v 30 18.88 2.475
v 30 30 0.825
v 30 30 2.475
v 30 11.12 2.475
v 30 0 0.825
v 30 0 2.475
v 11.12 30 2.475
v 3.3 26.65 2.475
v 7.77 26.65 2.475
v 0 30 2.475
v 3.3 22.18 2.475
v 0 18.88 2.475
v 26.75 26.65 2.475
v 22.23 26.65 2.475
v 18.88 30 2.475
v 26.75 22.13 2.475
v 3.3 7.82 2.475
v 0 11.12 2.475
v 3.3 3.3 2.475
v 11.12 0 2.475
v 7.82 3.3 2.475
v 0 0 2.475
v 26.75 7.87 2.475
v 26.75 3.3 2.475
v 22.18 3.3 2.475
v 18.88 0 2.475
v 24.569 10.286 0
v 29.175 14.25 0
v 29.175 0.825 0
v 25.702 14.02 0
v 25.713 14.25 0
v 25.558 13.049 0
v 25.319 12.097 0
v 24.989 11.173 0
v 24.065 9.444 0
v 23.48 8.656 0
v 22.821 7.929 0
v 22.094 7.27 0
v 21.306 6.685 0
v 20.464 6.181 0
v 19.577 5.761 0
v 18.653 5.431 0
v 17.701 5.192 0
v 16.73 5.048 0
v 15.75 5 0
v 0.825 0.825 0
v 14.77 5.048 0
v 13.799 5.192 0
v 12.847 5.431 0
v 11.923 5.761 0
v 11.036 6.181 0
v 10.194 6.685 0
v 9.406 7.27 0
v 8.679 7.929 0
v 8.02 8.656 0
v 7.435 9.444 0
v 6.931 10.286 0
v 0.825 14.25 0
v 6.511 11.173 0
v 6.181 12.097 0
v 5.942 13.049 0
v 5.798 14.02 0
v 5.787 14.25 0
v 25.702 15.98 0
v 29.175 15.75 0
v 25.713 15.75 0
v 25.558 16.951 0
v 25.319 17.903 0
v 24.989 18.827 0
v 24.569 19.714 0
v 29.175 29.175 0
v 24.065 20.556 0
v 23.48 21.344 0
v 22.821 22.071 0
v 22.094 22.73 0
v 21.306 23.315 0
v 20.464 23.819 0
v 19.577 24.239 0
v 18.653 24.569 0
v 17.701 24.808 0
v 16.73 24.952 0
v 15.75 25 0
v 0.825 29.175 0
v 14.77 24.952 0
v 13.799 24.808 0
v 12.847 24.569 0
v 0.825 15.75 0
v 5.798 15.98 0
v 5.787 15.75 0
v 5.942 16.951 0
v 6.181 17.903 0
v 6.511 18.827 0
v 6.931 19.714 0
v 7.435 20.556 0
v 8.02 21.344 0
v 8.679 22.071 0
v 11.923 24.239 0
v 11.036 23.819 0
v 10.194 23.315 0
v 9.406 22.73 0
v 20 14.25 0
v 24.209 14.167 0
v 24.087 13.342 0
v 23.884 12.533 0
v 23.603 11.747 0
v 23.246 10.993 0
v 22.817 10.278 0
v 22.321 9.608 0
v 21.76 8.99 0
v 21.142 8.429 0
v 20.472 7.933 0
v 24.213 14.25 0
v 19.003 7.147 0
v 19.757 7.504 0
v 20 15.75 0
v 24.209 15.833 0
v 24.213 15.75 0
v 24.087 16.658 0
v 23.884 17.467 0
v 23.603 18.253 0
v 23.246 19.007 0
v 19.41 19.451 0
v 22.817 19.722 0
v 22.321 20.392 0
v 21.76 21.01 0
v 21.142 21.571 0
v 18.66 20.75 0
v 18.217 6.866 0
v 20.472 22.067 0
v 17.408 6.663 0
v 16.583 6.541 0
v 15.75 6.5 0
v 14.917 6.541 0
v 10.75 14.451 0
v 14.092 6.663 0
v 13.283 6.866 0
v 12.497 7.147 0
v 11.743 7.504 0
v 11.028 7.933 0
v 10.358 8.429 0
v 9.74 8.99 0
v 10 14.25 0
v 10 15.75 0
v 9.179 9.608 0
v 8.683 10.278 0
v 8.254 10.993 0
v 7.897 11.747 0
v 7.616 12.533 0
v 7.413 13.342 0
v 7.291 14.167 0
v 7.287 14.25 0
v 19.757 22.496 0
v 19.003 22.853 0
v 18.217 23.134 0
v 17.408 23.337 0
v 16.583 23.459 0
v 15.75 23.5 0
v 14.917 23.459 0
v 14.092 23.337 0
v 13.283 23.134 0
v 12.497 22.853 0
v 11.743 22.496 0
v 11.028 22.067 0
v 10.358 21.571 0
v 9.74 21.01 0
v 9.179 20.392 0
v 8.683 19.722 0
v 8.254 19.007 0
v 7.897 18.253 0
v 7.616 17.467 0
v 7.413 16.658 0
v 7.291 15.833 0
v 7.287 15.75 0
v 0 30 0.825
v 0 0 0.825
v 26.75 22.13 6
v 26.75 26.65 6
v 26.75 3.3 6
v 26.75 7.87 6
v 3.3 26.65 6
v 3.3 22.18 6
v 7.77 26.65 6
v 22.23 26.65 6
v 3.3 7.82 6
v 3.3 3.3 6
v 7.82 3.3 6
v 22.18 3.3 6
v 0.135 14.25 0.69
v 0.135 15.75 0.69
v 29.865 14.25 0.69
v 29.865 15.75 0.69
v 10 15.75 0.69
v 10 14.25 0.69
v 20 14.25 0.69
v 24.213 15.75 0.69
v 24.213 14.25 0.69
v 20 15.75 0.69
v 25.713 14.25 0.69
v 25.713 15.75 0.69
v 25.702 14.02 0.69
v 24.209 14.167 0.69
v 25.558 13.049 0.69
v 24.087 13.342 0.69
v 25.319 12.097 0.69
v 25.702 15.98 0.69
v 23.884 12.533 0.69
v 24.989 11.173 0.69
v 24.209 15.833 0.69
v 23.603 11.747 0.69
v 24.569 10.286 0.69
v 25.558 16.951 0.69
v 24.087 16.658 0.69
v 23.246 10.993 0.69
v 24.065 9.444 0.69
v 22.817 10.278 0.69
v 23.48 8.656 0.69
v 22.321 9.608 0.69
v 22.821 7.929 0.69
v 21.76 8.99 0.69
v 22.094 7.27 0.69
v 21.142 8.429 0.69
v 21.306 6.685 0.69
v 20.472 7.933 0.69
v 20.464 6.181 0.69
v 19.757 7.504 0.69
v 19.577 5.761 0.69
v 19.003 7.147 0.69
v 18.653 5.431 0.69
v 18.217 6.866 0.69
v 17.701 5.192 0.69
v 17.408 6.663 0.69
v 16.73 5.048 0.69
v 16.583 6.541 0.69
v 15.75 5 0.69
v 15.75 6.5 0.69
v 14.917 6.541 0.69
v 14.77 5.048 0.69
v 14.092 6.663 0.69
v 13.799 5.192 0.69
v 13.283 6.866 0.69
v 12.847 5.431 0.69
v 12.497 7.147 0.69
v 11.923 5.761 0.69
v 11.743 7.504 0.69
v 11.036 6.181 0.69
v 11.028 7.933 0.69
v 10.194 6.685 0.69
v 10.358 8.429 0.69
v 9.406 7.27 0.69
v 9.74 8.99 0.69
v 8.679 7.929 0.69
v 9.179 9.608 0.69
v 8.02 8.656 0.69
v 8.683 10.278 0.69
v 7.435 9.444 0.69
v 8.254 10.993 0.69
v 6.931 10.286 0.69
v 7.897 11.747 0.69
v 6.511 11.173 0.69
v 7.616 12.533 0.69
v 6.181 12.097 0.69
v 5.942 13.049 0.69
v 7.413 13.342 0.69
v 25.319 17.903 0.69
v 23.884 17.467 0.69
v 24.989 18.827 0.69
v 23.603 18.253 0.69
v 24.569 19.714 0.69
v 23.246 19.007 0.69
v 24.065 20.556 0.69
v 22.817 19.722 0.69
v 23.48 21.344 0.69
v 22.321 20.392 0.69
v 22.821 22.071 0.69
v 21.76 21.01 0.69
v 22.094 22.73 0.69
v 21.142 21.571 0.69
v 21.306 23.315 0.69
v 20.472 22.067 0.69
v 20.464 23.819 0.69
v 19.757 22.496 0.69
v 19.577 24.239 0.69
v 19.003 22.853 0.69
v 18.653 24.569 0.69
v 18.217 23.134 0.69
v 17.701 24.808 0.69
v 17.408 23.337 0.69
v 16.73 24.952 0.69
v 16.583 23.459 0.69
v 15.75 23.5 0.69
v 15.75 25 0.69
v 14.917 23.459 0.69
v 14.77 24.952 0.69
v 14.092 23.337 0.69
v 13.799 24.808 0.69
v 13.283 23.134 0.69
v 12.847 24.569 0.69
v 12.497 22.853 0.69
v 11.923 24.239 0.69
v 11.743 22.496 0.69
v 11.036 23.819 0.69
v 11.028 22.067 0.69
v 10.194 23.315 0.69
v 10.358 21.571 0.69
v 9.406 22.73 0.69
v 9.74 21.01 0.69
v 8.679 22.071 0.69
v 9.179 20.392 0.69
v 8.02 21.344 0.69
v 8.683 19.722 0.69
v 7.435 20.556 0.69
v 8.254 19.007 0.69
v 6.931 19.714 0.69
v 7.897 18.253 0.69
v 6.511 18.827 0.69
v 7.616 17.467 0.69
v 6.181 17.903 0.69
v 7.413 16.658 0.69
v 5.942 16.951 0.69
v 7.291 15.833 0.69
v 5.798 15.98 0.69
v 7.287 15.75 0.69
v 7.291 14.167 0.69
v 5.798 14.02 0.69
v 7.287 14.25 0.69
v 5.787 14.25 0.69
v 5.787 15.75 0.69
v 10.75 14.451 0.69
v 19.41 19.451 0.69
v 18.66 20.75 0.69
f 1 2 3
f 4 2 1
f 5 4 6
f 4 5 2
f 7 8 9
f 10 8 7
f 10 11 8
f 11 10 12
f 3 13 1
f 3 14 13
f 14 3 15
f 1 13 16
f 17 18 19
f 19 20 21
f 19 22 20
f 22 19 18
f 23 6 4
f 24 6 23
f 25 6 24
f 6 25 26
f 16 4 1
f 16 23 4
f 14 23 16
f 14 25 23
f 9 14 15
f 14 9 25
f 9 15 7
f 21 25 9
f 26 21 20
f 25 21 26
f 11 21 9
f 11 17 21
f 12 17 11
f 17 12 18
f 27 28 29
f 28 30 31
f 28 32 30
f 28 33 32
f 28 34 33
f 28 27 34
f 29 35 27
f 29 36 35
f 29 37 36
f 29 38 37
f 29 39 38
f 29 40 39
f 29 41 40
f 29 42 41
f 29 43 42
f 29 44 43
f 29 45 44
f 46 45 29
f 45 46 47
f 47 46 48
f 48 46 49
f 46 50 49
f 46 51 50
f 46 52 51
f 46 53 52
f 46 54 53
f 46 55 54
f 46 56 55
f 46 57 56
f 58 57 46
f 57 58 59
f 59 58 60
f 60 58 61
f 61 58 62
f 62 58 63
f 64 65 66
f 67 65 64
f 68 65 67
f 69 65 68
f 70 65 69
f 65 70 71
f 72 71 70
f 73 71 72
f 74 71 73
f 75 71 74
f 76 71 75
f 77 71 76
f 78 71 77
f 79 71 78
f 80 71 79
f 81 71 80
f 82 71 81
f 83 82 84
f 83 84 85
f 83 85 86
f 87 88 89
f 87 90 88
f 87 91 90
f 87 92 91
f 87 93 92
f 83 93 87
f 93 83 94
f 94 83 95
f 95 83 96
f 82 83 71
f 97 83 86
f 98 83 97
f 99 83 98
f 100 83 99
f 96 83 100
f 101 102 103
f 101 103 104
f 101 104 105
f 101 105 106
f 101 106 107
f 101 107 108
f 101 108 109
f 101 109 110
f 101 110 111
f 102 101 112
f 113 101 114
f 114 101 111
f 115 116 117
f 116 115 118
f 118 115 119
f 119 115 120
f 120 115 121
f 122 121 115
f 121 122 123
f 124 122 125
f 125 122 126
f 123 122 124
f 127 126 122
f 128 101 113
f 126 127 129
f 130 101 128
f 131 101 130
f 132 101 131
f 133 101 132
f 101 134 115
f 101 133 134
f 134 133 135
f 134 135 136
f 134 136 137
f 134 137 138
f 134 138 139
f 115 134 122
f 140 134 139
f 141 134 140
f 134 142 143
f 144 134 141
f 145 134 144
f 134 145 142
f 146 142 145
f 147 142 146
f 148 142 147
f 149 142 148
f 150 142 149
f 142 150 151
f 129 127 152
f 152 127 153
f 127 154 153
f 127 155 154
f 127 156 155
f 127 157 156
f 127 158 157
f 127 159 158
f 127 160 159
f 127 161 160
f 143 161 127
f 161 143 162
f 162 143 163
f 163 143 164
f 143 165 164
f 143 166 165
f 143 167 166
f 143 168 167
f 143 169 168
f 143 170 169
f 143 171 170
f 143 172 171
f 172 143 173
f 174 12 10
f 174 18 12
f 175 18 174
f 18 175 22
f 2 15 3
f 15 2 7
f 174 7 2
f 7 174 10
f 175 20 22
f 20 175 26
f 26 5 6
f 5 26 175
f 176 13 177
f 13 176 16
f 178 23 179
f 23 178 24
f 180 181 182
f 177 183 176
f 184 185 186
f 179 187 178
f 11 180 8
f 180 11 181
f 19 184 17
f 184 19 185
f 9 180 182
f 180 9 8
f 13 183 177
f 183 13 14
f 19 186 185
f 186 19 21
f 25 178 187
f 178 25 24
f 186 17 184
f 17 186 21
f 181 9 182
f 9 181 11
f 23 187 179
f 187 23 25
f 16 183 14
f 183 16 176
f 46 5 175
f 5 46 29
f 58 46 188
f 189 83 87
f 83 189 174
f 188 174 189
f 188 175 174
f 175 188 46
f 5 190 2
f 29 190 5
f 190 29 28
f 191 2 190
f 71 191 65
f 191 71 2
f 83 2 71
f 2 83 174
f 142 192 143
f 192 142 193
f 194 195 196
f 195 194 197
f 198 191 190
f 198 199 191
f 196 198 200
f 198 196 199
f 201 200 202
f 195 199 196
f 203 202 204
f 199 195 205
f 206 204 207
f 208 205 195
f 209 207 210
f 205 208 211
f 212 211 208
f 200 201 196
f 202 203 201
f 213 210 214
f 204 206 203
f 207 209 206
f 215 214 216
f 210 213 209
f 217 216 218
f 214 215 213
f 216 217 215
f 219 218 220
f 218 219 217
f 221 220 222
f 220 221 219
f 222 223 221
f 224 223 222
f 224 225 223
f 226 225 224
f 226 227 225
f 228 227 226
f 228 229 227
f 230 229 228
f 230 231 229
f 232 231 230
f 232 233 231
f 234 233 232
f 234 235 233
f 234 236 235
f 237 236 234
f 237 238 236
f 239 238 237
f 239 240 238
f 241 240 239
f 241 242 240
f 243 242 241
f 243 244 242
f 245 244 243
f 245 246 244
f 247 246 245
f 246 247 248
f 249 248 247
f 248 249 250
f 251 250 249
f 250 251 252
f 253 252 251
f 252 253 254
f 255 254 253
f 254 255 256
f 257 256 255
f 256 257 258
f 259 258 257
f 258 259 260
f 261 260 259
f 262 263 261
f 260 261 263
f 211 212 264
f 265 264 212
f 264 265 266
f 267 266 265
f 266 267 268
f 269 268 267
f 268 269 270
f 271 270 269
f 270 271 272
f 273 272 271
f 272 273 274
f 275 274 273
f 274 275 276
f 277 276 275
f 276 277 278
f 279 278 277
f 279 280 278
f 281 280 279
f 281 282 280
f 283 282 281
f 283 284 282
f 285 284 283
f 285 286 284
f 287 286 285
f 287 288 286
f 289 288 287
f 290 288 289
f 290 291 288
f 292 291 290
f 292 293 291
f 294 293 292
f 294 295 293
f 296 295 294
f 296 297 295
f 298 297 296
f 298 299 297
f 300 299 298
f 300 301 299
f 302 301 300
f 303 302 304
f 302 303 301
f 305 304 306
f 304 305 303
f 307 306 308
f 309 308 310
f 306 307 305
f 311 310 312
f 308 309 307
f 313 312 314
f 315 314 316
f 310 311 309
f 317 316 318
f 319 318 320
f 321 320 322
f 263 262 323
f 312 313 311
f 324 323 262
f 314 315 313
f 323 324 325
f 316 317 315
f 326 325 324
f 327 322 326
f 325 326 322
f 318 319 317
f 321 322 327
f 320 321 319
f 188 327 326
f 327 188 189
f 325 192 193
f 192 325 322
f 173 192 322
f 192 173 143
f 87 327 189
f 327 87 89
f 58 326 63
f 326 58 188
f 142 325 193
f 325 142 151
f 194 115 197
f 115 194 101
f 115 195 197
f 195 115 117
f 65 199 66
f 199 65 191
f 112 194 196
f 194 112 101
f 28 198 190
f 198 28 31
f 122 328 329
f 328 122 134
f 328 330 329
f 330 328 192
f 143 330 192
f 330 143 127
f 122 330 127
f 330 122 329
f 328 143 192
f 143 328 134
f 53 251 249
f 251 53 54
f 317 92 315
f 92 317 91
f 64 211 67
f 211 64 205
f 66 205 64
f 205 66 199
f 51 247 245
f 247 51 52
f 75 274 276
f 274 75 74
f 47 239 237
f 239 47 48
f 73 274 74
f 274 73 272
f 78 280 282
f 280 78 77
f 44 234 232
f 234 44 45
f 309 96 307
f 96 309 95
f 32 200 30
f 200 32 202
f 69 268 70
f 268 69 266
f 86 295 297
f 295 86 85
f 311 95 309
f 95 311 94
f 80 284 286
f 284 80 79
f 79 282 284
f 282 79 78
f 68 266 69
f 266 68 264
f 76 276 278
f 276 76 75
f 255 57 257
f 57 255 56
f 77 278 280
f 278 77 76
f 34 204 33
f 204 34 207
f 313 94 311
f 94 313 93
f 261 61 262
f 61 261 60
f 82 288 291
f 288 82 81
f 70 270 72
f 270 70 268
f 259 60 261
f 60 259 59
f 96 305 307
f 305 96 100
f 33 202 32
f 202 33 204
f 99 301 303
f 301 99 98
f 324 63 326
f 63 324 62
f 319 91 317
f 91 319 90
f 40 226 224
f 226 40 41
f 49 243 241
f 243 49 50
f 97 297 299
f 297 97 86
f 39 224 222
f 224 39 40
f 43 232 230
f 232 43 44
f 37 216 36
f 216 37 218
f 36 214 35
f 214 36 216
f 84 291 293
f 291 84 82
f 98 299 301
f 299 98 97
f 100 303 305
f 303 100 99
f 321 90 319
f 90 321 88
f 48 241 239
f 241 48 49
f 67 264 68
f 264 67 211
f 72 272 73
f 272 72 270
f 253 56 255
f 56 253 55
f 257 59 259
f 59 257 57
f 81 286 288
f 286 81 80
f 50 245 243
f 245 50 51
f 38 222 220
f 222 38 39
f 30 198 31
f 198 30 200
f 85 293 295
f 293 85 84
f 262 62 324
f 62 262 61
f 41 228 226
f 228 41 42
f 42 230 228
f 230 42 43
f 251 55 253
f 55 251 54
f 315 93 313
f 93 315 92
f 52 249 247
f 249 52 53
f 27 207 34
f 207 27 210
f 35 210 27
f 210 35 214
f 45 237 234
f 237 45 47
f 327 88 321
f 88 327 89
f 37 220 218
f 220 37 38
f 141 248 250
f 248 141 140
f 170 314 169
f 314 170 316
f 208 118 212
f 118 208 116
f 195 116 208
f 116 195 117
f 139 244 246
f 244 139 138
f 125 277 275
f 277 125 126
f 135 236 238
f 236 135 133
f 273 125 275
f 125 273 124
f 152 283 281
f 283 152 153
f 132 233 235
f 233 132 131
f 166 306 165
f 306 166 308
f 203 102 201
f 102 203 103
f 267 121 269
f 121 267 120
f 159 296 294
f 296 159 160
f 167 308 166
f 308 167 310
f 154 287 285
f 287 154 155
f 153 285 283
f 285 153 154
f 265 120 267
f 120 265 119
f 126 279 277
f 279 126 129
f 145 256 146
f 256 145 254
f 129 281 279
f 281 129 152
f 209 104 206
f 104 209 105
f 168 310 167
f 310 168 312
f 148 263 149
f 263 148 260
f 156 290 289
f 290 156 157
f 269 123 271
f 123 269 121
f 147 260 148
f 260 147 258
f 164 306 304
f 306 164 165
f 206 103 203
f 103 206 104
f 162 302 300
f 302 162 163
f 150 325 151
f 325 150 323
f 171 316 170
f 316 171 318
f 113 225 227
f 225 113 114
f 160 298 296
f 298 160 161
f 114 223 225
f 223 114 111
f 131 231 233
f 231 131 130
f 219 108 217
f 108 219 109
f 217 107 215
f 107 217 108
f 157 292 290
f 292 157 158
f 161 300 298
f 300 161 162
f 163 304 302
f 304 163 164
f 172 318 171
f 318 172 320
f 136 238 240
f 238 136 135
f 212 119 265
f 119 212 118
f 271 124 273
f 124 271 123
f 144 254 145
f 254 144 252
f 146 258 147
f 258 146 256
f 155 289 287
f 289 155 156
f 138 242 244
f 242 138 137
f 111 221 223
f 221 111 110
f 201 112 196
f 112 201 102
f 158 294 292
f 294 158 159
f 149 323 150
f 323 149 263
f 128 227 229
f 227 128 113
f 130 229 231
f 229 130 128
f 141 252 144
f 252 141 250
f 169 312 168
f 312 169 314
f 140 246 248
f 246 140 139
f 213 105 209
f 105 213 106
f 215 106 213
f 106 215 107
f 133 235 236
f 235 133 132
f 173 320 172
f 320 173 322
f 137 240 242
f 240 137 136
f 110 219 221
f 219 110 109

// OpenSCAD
// file: sym_switch_no.scad
// no = normally open
module switch_no(length, width, thickness, height)
{
    translate([0,-thickness/2,0])cube([length/2-width/2, thickness, height]);
    translate([(length/2+width/2),-thickness/2,0])cube([(length/2-width/2), thickness, height]);
    
    translate([(length/2-width/2),+thickness/2, 0])rotate([0,0,-60])cube([thickness, width, height]);
    
}

switch_no(30, 12, 1, 1);
// file: settings.scad
cube_width=30;
cube_height=16;
cube_thickness=3.3;

cap_width=30;
cap_height=6;
cap_thickness=3.3;

glyph_depth=0.7;
glyph_thickness=1.5;

photo_resitor_hole_r = 2.4;
spring_contact_hole_r = 3.125;
// file: sym_switch_reed_no.scad
use <sym_switch_no.scad>

// no = normally opened
module switch_reed_no(length, width, thickness, height)
{
    switch_no(length, width, thickness, height);
    radius = width;
    translate([2*length/4+thickness/2,0,0]) difference()
    {
        cylinder(r=radius, h=height, $fn=64);
        translate([0,0,-thickness/2])cylinder(r=(radius-thickness), h=(height+thickness), $fn=64);
    }
}

switch_reed_no(30, 10, 1, 0.5);
// file: cap_1x1.scad
include <settings.scad>

module cap_1x1(width, height, thickness, holes_mask)
{
    width1=width-thickness;
    difference()
    {
        union()
        {
            cube([width, width, thickness*3/4]);
            translate([thickness,thickness,0])cube([width-2*(thickness-0.025), width-2*(thickness+0.025), height]);
        }
        union()
        {
            translate([width/2,width/2,0])rotate([0,0,45])translate([-width1/2,-width1/2,thickness*3/4]) cube([width1,width1,height]);
                        //corners
            translate([0,0.25*thickness,0])rotate([45,0,0]) translate([-0.5*width, -width, -0.5*height]) cube([2*width, width, 2*height]);
            translate([0.25*thickness,0,0]) rotate([0,-45,0]) translate([-width, -0.5*width, -0.5*height]) cube([width, 2*width, 2*height]);
            translate([width-0.25*thickness,0,0]) rotate([0,45,0]) translate([0, 0, -0.5*height]) cube([width, 2*width, 2*height]);
            translate([0,width-0.25*thickness,0]) rotate([-45,0,0]) translate([-0.5*width, 0, -0.5*height]) cube([2*width, width, 2*height]);
            
            if (holes_mask >= 8)
            {
                translate([width/2, thickness-1.5, -0.5]) cylinder(r=1.15, h=height*1.5, $fn=80);
            }
            if ((holes_mask%8) >= 4)
            {
                translate([width/2, width-thickness+1.5, -0.5]) cylinder(r=1.15, h=height*1.5, $fn=80);
            }
            if ((holes_mask%4)>= 2)
            {
                translate([thickness-1.5, width/2, -0.5]) cylinder(r=1.15, h=height*1.5, $fn=80);
            }
            if (holes_mask%2 >= 1)
            {
                translate([width-thickness+1.5, width/2, -0.5]) cylinder(r=1.15, h=height*1.5, $fn=80);
            }
        }
    }
}

cap_1x1(cap_width, cap_height, cap_thickness, 9);
//ring(10,1,1);
//arrow(1, 20, 3, 1);
//transistor_npn(30, 1, 1);
// main file
use <cap_1x1.scad>
use <sym_switch_reed_no.scad>
include <settings.scad>

// no = normally open
module cap_1x1_switch_reed_no(width, height, thickness)
{
    difference()
    {
        cap_1x1(width, height, thickness, 0); //3
        translate([0,width/2,-0.01]) switch_reed_no(width, width/3, glyph_thickness, glyph_depth);
    }
}

cap_1x1_switch_reed_no(cap_width, cap_height, cap_thickness);
